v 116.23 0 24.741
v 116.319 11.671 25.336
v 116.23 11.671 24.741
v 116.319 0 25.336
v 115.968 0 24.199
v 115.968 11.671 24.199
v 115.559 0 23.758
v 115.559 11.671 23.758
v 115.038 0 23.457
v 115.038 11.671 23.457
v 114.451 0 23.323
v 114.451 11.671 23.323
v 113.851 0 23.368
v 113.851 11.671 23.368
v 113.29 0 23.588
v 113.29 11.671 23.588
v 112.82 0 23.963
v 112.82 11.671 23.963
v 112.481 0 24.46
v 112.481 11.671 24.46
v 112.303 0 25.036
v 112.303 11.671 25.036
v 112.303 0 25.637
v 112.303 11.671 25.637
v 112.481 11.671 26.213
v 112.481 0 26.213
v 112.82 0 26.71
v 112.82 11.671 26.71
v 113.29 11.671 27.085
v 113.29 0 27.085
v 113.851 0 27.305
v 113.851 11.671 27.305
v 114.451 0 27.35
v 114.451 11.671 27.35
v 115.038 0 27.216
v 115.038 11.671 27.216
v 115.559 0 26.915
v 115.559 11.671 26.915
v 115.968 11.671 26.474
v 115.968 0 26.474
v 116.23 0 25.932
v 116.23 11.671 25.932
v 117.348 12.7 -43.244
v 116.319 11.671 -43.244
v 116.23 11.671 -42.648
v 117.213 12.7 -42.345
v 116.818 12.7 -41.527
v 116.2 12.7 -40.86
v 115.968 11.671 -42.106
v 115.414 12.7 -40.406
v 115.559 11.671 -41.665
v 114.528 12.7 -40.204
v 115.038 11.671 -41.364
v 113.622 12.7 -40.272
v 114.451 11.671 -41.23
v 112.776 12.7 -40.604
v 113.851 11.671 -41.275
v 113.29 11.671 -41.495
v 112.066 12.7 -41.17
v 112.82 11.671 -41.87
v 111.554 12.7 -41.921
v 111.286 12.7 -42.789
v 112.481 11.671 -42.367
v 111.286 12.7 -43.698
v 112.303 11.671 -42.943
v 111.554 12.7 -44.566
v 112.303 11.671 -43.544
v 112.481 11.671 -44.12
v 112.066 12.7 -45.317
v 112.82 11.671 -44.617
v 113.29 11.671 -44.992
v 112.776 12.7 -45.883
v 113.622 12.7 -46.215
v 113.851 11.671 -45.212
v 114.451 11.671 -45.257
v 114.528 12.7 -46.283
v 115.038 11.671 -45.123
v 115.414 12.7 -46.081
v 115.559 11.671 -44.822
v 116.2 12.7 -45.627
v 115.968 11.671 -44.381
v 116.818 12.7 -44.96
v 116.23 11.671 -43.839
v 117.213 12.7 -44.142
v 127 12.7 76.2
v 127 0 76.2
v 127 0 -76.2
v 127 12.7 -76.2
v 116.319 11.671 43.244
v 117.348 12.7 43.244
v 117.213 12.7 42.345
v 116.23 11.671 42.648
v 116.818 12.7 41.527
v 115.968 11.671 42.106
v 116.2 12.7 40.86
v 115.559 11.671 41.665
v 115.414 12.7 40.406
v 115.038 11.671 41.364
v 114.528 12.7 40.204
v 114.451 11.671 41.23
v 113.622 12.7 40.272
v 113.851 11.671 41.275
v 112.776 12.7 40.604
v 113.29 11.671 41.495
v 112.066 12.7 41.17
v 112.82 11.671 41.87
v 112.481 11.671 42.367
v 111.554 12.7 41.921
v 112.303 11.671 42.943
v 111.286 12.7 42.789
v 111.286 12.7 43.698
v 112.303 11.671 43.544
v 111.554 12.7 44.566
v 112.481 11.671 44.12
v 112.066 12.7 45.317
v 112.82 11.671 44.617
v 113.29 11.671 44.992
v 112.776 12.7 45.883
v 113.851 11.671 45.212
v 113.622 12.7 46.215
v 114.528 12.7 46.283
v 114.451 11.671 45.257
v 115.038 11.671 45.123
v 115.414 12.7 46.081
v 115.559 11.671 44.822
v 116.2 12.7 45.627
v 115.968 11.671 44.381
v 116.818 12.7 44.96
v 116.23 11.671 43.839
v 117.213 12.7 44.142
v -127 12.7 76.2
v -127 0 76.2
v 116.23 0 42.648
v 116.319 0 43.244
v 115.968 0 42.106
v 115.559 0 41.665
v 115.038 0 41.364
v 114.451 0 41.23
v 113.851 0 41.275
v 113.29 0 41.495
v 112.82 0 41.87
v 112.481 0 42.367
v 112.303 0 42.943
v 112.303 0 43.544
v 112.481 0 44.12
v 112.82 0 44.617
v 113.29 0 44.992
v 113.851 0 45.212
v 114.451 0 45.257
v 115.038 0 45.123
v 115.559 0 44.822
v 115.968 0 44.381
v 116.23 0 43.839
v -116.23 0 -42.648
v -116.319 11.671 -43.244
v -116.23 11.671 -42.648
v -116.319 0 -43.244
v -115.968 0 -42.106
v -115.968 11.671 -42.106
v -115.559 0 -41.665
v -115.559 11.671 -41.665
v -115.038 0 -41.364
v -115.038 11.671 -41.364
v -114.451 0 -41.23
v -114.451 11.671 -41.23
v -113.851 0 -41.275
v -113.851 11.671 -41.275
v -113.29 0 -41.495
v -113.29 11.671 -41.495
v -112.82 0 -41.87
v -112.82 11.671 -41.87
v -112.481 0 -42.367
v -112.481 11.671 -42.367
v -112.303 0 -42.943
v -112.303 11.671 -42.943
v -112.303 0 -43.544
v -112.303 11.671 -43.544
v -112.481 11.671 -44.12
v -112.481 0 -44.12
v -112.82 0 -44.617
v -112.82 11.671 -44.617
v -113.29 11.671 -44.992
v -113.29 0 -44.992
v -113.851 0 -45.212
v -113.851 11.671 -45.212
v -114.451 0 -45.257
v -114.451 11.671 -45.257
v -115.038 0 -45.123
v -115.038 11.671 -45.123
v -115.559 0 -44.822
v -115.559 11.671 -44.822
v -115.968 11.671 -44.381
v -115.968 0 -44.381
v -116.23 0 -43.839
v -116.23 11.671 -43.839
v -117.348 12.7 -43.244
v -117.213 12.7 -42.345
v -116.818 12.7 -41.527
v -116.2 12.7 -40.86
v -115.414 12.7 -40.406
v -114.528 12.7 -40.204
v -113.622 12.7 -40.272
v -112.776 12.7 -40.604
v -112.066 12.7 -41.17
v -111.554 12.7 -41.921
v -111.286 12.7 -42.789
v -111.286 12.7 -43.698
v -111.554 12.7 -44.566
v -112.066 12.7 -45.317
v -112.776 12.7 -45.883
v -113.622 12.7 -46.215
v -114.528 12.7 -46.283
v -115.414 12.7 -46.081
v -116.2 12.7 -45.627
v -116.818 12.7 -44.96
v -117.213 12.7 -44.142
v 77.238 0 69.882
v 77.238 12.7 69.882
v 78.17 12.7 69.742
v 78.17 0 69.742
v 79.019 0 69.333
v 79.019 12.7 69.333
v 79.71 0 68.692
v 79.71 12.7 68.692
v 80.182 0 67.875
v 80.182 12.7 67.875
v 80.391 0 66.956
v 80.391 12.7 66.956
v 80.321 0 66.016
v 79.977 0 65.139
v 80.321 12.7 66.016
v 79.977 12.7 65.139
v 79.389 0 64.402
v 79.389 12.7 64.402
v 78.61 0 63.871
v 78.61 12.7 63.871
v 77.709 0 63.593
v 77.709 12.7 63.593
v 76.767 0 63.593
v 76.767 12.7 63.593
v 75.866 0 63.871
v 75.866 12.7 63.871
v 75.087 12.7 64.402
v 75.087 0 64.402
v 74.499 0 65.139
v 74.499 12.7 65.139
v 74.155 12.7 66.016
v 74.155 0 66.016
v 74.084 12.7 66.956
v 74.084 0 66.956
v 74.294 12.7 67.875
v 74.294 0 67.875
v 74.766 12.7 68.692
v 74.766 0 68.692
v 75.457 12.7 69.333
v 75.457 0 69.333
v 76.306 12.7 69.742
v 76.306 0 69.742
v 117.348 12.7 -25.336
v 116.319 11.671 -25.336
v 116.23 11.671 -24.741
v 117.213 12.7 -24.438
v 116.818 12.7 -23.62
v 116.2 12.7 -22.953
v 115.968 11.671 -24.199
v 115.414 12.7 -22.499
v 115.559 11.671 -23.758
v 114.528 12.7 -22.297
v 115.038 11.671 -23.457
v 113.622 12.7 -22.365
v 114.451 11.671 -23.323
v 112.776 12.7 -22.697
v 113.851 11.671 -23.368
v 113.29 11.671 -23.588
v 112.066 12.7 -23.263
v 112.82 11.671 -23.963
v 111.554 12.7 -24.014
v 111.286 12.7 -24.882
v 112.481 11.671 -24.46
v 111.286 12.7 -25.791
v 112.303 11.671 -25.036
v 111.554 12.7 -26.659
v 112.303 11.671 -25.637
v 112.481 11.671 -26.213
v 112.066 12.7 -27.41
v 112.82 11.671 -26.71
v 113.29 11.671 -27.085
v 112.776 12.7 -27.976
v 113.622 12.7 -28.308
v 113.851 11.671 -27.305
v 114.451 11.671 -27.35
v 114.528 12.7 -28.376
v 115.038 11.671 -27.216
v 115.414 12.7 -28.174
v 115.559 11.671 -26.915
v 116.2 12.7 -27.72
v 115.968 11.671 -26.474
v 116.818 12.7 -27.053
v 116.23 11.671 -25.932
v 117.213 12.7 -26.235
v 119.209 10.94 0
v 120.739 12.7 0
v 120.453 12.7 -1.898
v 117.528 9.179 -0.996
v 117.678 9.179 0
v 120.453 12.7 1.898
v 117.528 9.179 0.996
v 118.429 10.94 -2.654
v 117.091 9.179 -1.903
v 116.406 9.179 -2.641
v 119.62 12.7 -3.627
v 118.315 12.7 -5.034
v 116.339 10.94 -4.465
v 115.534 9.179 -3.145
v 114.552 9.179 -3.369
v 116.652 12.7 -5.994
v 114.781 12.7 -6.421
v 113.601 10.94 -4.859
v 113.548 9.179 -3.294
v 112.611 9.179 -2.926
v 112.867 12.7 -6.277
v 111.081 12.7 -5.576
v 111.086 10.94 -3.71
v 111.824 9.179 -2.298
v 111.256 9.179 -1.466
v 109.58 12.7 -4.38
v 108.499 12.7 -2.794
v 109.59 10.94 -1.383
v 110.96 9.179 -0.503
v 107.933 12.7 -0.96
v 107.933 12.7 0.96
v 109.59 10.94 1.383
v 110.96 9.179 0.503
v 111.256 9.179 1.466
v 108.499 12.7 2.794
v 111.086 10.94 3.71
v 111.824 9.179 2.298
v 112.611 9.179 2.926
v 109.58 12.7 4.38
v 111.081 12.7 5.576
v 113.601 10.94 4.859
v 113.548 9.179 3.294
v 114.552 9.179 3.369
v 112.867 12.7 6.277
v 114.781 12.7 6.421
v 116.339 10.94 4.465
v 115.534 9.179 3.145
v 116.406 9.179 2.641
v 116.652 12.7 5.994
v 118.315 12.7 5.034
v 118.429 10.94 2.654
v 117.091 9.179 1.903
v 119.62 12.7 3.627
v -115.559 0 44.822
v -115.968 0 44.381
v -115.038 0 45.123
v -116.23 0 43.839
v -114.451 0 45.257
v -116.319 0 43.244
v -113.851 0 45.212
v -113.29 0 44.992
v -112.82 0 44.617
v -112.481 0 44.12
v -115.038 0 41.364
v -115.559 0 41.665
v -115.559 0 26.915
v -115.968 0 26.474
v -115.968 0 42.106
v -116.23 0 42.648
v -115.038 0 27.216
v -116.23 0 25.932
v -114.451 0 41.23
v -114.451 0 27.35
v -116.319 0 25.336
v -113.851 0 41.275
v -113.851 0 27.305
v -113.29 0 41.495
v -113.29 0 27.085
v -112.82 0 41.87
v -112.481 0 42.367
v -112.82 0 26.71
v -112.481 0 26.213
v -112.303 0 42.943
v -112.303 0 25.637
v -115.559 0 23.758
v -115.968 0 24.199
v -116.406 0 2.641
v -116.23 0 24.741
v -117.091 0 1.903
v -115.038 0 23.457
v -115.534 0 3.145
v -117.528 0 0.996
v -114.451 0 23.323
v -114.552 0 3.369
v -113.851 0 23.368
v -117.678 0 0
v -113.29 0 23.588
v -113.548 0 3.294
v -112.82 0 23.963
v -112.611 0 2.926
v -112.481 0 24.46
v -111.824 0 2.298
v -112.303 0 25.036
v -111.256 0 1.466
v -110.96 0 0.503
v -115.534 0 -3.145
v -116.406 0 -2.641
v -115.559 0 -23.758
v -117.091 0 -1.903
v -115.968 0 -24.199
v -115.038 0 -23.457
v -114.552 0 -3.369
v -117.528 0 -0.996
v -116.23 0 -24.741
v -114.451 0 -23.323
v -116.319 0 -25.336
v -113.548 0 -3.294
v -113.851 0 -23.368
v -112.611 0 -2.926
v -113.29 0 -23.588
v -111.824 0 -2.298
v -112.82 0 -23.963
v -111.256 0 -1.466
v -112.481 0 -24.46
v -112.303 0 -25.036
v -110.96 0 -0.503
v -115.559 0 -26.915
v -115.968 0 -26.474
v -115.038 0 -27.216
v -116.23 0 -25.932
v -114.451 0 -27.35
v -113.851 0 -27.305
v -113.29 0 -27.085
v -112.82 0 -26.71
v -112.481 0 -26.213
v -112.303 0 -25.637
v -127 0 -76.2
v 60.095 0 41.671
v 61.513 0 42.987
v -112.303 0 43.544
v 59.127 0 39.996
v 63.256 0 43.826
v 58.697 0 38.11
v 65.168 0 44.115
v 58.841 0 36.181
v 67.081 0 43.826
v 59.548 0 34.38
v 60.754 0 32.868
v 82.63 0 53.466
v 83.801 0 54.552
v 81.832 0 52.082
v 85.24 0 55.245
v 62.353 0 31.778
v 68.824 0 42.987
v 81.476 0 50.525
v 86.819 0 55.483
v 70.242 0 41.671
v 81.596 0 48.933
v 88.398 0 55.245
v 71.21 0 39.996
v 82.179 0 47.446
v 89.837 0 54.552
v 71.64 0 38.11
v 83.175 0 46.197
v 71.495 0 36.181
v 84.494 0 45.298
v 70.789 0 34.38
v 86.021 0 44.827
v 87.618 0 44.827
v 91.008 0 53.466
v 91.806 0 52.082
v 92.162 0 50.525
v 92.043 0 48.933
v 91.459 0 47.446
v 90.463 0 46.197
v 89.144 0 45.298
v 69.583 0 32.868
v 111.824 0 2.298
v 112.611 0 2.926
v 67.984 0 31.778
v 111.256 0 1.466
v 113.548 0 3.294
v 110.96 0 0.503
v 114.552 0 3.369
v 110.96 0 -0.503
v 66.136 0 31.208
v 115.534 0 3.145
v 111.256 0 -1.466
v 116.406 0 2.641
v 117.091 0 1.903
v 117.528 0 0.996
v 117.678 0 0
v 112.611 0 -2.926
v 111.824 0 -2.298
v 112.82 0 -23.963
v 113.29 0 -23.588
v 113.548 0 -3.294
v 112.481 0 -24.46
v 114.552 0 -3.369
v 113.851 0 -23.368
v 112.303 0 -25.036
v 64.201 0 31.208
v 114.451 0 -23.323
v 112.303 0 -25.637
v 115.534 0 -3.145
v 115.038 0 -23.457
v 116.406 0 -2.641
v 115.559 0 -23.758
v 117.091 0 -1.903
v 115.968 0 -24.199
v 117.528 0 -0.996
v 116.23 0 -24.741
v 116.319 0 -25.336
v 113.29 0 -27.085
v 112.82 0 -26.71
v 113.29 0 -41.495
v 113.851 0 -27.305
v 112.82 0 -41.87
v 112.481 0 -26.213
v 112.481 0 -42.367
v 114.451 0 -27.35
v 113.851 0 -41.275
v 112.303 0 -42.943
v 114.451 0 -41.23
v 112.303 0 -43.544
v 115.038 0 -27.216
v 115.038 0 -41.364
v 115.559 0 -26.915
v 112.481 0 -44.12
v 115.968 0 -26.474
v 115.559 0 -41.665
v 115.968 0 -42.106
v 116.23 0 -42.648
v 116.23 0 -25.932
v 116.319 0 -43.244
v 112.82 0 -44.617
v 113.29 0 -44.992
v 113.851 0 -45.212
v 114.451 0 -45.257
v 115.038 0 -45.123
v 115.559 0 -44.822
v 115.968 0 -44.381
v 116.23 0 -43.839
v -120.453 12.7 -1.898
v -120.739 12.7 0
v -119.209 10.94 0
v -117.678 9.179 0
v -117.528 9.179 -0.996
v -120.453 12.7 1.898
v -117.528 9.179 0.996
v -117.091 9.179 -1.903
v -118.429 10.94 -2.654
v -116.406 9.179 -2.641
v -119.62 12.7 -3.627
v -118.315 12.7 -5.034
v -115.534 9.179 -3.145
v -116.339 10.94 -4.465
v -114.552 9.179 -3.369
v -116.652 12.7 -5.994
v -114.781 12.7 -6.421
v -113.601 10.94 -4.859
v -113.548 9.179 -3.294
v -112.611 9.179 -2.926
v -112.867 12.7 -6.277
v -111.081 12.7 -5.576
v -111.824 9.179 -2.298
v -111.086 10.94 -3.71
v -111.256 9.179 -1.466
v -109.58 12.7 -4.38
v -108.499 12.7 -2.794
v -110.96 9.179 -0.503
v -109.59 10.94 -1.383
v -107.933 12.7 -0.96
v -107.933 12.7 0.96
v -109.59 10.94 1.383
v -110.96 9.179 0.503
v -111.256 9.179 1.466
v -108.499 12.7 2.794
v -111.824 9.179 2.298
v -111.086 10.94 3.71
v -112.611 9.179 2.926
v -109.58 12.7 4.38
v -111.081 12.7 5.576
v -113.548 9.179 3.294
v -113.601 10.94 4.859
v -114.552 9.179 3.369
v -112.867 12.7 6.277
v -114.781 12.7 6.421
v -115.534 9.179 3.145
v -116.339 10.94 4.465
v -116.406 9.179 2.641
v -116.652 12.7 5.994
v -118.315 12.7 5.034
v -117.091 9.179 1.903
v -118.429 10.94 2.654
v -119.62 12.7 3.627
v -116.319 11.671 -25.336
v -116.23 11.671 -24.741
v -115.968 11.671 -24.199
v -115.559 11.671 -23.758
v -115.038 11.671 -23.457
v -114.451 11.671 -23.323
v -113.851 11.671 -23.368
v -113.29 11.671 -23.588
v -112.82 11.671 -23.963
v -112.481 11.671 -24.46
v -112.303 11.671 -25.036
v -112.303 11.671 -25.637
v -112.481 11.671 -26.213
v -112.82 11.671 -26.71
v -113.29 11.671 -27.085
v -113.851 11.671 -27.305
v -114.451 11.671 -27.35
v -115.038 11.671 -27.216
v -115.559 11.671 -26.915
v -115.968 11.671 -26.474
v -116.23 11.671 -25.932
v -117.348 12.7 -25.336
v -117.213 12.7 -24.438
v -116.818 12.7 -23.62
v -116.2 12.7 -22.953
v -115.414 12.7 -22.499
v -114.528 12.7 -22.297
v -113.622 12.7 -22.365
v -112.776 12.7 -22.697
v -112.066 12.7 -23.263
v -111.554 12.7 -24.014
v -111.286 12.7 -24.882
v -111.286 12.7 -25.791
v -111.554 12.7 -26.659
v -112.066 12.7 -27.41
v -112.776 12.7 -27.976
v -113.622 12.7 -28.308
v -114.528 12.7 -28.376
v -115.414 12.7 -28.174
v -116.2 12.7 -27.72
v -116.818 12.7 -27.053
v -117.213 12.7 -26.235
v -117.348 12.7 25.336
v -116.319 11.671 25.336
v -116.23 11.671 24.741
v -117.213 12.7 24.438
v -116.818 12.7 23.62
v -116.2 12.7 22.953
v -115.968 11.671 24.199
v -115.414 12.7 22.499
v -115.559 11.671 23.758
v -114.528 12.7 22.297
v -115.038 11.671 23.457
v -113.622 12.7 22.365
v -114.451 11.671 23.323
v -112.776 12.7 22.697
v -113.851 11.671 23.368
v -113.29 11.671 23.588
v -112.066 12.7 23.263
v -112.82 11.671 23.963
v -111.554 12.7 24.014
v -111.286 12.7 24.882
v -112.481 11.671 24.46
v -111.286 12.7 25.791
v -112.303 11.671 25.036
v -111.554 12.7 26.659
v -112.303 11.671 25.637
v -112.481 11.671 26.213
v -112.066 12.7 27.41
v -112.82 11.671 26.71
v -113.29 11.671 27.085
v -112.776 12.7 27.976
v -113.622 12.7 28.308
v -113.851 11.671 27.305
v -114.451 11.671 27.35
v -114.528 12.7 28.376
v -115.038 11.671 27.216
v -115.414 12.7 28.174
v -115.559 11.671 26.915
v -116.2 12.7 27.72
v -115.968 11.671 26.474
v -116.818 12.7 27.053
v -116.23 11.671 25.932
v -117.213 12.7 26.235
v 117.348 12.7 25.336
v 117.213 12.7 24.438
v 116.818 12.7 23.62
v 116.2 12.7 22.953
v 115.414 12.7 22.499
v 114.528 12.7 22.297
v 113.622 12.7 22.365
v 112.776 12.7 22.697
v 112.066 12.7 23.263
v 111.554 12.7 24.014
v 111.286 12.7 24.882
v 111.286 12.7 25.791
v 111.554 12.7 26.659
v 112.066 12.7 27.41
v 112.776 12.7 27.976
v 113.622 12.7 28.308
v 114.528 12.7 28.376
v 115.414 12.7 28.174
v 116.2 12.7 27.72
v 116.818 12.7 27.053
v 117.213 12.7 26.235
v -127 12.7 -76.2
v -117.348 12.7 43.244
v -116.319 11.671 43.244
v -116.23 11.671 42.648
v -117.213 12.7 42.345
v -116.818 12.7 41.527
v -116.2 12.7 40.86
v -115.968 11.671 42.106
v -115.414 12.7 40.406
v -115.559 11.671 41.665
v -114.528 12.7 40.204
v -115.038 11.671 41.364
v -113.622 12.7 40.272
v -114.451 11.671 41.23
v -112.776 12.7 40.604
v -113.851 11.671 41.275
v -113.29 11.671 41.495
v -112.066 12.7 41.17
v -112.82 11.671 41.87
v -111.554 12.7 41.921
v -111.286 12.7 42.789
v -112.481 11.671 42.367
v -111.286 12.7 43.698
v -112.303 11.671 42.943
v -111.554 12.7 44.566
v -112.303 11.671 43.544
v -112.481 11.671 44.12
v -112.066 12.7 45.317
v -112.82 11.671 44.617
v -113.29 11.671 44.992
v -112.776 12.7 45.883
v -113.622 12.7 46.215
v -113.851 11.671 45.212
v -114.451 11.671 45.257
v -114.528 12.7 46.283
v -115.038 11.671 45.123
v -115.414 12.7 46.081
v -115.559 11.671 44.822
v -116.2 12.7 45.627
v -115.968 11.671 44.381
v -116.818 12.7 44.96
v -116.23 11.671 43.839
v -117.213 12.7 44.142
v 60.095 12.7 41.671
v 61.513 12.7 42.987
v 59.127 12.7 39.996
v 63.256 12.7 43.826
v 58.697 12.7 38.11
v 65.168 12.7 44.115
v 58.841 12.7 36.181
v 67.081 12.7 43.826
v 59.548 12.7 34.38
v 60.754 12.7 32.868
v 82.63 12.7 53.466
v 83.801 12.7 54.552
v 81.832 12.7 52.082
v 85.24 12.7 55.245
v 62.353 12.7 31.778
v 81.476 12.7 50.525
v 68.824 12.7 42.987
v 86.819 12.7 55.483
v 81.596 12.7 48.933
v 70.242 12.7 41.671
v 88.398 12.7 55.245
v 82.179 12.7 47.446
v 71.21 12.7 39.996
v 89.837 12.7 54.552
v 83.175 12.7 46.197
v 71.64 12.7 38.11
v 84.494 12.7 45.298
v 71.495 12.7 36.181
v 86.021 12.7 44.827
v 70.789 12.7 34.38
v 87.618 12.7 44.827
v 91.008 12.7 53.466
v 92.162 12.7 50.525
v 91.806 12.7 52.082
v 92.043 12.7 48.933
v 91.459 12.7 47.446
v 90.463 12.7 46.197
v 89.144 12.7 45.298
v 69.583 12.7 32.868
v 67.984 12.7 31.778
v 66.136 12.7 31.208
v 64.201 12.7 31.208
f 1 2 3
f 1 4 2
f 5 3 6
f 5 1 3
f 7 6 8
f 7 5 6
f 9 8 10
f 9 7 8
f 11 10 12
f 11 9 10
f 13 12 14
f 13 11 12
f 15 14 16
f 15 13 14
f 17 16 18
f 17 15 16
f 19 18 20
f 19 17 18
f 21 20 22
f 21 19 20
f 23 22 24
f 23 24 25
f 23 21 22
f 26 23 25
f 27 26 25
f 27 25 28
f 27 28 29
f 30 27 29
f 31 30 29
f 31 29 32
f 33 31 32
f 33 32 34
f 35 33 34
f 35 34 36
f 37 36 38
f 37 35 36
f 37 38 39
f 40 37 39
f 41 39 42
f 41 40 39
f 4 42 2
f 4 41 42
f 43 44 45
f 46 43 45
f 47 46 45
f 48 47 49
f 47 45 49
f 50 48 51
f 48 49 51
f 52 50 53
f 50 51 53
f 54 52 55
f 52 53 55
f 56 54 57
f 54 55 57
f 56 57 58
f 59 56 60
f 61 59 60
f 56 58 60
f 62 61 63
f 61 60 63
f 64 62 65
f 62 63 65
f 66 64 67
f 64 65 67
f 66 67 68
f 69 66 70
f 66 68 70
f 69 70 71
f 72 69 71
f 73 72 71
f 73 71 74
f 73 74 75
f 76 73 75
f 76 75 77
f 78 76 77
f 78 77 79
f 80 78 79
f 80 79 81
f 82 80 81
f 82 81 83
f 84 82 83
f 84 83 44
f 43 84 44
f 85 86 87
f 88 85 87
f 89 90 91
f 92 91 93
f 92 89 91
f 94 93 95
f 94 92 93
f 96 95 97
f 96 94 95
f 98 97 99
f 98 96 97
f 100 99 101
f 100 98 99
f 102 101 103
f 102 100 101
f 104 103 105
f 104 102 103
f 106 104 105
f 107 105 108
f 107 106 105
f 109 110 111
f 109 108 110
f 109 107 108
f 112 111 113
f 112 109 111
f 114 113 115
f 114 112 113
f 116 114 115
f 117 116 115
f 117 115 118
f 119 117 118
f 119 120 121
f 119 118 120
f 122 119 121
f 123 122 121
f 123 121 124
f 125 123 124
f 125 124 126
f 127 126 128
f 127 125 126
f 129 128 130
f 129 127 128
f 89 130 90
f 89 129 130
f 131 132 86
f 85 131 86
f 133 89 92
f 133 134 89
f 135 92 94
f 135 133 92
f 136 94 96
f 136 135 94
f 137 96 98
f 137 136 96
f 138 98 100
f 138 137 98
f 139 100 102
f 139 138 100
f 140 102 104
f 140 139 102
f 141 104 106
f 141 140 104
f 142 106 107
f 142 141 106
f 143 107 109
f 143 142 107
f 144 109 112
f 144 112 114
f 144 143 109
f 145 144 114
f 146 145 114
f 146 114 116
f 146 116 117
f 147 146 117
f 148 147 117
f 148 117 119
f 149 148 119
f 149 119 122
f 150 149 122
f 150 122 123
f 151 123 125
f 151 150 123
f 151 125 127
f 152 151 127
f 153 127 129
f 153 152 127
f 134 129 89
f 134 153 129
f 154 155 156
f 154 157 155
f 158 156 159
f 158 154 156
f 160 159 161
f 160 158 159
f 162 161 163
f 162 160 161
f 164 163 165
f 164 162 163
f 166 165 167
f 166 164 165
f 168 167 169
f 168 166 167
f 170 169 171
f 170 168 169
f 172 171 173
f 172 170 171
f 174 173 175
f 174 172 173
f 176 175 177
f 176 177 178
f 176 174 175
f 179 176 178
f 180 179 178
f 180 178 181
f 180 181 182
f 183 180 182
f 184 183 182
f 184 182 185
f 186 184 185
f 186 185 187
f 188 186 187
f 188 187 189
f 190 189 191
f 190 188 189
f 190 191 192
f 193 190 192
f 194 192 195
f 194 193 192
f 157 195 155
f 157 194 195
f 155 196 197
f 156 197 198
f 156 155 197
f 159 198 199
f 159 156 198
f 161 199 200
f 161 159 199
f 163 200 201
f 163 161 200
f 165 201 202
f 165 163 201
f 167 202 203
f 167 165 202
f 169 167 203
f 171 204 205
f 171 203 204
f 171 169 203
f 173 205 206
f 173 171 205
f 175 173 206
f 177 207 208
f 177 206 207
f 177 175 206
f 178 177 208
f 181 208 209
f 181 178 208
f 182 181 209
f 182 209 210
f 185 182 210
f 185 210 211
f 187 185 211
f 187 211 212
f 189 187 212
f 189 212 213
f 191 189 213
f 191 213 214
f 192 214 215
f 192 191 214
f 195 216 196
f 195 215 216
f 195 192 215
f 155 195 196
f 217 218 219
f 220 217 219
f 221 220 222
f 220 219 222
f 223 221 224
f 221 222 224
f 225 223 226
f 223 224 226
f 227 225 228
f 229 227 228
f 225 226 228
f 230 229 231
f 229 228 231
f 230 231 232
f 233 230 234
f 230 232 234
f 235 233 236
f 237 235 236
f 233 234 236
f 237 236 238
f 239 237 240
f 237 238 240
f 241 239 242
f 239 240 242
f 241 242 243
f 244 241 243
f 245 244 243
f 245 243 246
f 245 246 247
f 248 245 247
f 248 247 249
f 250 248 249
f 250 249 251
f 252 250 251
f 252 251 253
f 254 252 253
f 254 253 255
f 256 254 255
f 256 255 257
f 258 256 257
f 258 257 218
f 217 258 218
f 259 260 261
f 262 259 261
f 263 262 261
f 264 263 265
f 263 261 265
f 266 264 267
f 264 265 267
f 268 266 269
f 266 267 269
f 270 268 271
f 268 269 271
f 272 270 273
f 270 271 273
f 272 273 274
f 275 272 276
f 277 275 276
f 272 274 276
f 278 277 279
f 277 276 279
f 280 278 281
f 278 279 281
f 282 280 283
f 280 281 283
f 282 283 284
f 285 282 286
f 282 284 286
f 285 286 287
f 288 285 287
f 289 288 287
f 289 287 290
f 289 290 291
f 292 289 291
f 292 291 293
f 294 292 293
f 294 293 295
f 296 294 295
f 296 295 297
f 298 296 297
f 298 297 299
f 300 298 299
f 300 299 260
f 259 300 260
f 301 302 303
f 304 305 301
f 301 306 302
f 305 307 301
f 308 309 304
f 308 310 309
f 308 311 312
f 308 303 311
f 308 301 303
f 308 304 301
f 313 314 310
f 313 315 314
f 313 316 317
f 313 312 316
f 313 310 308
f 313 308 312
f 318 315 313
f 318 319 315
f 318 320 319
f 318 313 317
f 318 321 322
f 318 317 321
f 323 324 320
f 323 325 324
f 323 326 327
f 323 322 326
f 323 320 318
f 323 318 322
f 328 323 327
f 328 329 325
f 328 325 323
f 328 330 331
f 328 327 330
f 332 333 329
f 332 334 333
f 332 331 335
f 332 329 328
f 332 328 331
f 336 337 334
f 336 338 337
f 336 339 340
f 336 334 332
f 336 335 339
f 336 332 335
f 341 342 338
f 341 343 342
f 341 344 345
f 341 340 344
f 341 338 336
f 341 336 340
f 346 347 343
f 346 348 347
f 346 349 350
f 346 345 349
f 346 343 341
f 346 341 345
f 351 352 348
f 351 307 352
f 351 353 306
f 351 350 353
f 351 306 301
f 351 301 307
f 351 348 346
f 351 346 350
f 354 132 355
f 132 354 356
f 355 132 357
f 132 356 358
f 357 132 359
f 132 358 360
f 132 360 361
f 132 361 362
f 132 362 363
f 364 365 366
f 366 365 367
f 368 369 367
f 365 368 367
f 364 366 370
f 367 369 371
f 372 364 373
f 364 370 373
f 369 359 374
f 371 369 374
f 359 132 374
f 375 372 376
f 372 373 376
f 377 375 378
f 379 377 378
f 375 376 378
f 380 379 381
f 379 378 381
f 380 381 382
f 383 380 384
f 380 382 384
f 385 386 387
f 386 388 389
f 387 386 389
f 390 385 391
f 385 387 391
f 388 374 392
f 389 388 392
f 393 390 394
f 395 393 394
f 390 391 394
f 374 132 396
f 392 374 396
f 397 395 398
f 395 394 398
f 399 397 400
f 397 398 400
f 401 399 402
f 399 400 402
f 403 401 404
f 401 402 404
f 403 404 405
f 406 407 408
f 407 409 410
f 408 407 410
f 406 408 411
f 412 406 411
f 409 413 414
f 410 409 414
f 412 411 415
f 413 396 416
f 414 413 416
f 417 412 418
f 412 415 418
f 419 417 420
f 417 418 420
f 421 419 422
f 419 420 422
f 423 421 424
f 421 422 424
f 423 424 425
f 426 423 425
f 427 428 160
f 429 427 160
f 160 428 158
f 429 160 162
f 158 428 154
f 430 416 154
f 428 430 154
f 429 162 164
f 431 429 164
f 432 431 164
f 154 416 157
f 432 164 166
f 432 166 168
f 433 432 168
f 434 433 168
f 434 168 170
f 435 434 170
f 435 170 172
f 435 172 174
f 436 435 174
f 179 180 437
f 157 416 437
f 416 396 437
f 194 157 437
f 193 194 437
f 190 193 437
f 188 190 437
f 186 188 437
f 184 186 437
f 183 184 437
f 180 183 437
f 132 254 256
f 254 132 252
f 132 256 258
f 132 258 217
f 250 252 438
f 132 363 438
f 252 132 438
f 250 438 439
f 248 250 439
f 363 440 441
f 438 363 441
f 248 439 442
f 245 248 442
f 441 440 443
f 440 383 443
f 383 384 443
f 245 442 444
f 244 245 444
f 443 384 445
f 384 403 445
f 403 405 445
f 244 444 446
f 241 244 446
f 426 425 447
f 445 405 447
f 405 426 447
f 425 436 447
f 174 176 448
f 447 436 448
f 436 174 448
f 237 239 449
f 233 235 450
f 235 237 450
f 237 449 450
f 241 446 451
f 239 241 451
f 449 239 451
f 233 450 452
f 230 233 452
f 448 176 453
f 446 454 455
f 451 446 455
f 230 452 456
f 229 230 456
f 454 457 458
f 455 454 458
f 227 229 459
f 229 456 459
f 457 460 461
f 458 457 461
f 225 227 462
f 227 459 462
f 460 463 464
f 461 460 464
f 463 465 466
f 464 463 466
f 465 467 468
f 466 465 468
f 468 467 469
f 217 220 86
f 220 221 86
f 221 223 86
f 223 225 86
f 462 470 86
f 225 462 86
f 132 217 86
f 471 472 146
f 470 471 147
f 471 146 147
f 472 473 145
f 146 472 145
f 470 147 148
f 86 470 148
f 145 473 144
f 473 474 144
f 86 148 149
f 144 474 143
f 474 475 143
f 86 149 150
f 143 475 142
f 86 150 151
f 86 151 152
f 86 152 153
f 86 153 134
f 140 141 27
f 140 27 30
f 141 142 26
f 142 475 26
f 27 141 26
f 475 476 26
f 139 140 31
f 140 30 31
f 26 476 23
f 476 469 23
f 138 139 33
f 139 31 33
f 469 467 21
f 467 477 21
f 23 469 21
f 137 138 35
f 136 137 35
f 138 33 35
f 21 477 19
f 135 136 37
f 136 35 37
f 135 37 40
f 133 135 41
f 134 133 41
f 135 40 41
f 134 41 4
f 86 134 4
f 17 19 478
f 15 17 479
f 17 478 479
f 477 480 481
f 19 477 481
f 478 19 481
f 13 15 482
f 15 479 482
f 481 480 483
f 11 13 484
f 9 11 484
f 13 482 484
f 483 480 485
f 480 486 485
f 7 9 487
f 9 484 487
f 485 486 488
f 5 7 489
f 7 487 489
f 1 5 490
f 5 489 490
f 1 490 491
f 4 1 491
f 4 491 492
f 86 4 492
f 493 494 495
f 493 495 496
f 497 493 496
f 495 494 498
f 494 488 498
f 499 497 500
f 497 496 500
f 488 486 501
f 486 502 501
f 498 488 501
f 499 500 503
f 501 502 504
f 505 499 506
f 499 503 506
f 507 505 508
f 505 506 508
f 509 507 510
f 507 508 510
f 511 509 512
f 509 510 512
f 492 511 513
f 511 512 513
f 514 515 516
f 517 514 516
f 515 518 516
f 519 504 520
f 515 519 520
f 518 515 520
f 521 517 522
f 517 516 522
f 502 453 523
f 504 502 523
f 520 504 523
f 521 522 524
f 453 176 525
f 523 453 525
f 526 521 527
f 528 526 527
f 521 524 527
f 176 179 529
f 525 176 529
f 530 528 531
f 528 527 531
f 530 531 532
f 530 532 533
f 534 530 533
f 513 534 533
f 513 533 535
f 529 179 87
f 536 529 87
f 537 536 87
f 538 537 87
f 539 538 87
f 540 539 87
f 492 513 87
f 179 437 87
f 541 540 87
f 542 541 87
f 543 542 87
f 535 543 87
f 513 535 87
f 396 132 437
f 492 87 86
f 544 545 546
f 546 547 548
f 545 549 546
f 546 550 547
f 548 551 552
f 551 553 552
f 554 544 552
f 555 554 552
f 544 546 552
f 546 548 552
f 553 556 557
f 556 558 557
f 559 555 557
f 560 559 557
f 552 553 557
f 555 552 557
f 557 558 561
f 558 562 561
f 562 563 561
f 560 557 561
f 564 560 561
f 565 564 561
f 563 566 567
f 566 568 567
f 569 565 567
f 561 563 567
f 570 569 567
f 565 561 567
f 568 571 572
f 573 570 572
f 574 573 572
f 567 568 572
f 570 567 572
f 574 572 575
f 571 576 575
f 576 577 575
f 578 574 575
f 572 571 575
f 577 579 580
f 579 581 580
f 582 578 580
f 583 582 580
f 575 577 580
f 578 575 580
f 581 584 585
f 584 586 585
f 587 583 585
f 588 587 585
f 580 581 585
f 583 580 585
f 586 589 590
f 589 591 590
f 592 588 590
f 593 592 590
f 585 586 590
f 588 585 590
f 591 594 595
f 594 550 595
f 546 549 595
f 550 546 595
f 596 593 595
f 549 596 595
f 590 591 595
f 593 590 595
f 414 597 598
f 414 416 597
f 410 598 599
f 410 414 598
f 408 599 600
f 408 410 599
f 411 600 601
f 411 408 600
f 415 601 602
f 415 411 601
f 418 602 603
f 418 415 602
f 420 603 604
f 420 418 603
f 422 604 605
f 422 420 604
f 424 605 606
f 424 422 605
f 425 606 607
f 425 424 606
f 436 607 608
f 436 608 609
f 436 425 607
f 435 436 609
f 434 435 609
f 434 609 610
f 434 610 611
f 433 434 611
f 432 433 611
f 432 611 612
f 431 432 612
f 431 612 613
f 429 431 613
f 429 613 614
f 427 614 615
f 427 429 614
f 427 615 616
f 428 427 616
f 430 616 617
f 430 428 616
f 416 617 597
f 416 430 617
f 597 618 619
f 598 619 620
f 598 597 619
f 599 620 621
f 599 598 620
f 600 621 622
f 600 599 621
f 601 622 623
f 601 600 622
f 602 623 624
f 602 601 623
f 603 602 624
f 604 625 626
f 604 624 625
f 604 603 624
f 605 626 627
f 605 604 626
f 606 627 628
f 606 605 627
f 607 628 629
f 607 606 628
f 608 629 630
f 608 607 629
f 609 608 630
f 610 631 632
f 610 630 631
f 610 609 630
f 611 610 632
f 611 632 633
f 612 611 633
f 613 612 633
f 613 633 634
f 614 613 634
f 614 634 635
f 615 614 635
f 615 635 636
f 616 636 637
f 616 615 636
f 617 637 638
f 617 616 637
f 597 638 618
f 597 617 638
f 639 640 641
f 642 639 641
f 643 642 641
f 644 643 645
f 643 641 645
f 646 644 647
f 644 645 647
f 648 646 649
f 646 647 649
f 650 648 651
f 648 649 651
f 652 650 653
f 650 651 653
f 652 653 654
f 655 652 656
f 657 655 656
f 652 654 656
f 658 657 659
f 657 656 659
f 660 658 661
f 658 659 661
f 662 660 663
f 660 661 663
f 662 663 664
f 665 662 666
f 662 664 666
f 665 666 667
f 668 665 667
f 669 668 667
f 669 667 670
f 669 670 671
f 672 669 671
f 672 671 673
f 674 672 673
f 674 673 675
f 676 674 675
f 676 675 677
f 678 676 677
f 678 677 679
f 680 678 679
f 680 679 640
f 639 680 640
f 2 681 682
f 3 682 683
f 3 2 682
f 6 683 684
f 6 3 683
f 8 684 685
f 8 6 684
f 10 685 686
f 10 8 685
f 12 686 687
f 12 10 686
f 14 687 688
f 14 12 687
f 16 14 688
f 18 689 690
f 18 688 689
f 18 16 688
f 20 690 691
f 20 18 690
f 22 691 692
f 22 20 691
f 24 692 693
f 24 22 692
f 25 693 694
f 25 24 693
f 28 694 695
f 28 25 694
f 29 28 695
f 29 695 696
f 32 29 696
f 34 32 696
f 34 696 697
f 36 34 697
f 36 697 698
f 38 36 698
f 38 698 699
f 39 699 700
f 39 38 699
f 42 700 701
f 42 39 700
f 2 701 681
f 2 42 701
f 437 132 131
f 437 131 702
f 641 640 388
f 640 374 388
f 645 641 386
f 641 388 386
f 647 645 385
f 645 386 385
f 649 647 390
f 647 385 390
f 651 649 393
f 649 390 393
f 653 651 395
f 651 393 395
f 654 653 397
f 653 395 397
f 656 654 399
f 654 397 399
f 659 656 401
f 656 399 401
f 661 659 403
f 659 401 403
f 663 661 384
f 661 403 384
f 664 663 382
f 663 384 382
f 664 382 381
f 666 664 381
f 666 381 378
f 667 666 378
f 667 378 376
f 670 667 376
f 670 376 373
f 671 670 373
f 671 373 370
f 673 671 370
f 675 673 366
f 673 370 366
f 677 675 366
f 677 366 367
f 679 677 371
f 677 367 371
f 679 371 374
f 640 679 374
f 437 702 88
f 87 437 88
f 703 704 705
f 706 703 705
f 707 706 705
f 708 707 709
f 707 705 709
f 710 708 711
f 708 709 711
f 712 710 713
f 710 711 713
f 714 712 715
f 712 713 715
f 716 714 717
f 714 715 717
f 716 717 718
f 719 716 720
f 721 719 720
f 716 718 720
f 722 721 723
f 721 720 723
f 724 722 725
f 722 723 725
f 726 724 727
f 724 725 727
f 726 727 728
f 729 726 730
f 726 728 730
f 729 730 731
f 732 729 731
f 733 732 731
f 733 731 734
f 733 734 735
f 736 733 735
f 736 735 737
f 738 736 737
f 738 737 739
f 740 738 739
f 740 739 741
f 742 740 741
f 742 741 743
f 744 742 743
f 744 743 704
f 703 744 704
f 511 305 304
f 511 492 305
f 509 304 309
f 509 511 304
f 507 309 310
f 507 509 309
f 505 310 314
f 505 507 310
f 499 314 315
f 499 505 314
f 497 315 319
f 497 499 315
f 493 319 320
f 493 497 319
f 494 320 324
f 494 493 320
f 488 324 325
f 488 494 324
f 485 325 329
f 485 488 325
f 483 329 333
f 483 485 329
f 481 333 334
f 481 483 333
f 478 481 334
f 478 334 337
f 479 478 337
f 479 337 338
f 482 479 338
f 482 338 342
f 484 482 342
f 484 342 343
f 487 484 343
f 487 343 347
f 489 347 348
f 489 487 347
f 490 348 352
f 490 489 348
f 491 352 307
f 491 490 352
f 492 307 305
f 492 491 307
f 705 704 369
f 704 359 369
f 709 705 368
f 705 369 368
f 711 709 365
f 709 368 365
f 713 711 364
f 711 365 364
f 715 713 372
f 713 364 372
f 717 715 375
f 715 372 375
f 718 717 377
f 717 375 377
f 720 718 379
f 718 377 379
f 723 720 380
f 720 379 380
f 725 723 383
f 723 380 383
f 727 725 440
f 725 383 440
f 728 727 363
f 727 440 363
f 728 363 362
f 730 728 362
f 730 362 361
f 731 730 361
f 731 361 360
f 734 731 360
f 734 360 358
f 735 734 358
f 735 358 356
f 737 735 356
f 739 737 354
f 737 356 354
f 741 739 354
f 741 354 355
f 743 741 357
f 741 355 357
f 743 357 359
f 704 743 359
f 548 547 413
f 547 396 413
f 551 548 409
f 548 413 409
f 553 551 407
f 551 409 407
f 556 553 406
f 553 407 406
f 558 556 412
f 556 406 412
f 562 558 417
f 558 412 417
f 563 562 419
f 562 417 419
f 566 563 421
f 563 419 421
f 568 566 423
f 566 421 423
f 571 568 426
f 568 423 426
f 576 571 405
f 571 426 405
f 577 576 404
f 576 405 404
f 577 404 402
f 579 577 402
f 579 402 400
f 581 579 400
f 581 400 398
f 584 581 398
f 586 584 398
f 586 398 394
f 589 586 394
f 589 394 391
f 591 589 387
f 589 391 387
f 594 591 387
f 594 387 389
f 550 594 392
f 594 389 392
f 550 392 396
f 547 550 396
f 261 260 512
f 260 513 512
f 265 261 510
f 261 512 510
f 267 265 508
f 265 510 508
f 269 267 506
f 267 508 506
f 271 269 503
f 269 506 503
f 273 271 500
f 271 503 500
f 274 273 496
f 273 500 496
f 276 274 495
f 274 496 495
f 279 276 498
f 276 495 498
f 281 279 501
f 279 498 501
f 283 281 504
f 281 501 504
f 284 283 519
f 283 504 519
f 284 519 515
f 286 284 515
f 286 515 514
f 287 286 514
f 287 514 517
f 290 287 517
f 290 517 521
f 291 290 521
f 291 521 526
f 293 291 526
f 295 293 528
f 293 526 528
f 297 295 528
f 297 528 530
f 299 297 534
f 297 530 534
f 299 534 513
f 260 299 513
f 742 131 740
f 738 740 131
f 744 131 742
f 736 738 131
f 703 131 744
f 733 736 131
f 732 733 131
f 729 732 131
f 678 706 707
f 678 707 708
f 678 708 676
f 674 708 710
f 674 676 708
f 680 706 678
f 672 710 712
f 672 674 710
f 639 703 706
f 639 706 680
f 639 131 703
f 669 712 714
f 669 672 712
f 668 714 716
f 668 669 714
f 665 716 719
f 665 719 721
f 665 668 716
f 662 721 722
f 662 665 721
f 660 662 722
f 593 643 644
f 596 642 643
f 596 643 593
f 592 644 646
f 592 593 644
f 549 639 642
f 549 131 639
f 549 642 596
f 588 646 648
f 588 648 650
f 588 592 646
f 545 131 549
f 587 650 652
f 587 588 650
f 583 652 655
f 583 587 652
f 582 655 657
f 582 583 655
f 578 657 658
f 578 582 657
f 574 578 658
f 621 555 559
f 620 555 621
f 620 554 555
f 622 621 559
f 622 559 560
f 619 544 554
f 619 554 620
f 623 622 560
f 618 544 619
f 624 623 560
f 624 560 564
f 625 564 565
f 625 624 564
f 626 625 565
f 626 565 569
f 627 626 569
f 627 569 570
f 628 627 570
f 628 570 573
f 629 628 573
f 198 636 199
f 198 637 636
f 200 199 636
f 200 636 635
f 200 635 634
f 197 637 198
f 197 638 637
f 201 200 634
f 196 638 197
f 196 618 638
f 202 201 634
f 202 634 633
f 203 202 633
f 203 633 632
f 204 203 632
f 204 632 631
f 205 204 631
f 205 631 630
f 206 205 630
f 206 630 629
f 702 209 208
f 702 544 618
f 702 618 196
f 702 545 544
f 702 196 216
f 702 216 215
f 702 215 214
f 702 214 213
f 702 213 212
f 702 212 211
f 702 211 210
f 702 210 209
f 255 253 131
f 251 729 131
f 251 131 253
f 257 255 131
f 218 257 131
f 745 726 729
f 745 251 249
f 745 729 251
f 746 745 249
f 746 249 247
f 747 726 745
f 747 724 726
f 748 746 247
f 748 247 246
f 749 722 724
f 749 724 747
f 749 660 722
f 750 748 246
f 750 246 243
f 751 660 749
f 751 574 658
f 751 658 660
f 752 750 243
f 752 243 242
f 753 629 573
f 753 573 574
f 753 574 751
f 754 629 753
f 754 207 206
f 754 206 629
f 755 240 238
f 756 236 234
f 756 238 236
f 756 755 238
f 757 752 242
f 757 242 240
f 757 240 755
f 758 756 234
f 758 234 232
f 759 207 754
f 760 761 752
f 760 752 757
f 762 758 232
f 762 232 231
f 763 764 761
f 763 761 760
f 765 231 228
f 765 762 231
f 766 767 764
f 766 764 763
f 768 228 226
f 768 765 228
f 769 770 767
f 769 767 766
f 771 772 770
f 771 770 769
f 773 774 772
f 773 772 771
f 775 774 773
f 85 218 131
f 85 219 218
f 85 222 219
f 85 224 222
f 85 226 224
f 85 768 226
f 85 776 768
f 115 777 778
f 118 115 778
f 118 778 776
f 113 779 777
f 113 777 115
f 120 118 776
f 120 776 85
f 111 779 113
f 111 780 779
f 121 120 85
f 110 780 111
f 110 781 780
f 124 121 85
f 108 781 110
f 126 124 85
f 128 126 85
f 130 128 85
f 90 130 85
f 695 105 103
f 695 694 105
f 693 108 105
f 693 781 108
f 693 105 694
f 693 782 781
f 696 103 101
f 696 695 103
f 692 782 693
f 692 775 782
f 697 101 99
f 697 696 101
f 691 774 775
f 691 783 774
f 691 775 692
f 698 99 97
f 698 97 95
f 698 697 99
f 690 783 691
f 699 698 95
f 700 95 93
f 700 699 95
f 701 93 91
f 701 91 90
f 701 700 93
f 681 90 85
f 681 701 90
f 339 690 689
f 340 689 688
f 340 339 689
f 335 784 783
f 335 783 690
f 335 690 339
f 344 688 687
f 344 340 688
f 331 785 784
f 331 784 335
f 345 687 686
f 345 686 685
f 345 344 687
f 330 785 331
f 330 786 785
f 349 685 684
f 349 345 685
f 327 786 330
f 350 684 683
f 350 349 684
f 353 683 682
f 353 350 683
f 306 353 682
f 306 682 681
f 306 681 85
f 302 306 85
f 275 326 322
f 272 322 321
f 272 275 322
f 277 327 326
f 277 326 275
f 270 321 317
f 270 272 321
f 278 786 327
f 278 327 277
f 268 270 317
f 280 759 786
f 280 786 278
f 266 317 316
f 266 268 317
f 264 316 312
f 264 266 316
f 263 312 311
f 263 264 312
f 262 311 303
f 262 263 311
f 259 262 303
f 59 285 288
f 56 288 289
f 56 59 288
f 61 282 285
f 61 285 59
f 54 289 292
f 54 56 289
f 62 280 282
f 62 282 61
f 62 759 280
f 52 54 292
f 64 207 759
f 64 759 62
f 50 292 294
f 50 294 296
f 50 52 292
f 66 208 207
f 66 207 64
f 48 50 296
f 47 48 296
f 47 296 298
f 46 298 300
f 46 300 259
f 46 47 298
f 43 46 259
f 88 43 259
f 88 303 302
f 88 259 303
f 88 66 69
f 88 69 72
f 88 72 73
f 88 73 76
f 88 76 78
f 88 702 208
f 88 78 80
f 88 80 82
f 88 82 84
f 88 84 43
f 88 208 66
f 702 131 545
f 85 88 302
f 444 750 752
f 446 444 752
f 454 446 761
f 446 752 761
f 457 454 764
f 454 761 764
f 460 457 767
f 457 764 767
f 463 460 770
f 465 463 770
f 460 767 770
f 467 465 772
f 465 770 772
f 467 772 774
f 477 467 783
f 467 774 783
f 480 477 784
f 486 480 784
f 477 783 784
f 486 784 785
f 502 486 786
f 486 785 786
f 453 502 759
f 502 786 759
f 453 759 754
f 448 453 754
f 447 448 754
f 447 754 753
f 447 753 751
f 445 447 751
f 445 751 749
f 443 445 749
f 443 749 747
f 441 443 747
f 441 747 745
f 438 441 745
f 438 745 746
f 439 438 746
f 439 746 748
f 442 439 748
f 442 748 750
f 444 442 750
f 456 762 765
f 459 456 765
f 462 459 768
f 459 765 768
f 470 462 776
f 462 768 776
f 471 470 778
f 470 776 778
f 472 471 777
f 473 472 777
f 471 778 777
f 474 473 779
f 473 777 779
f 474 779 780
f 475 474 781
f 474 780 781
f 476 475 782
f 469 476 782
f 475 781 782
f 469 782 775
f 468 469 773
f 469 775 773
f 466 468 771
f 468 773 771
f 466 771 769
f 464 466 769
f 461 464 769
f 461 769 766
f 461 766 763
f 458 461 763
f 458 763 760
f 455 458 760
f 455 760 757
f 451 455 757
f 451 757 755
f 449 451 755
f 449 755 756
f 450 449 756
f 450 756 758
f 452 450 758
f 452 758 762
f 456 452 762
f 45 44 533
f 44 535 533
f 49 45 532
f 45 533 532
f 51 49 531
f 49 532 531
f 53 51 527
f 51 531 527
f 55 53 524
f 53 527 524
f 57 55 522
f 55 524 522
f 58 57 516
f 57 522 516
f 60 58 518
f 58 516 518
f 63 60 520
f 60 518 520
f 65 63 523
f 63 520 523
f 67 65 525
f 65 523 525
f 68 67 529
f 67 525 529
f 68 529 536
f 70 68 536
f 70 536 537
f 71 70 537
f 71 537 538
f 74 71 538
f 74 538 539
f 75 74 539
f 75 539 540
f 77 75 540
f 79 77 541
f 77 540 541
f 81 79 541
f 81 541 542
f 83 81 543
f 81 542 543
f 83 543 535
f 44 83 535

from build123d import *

# Parameters (mm, degrees)
SKETCH1_W                                        = 254
SKETCH1_H                                        = 152.4
BOSS_EXTRUDE1_DEPTH                              = 12.7
SKETCH2_W                                        = 203.2
SKETCH2_H                                        = 63.5
CUT_EXTRUDE1_DEPTH                               = 149.649688866
SKETCH11_W                                       = 203.2
SKETCH11_H                                       = 63.5
BOSS_EXTRUDE2_DEPTH                              = 12.7
SKETCH13_R                                       = 5.3578125
SKETCH13_R_2                                     = 6.4897
CUT_EXTRUDE8_DEPTH                               = 149.649688866
SKETCH14_R                                       = 3.1623
CUT_EXTRUDE9_DEPTH                               = 149.649688866
F_10_32_TAPPED_HOLE2_D                           = 4.0386
F_10_32_TAPPED_HOLE2_CSINK_D                     = 6.096
F_10_32_TAPPED_HOLE2_CSINK_ANGLE                 = 90
MIRROR2_COPY_1_D                                 = 4.0386
MIRROR2_COPY_1_CSINK_D                           = 6.096
MIRROR2_COPY_1_CSINK_ANGLE                       = 90
CSK_FOR_1_4_FLAT_HEAD_MACHINE_SCREW1_D           = 6.7564
CSK_FOR_1_4_FLAT_HEAD_MACHINE_SCREW1_CSINK_D     = 12.8778
CSK_FOR_1_4_FLAT_HEAD_MACHINE_SCREW1_CSINK_ANGLE = 82


with BuildPart() as part:
    # Sketch1 → Boss-Extrude1 (new body)
    with BuildSketch(Plane(origin=(0, 0, 0), x_dir=(1, 0, 0), z_dir=(0, 1, 0))):
        Rectangle(SKETCH1_W, SKETCH1_H)
    extrude(amount=BOSS_EXTRUDE1_DEPTH)

    # Sketch2 → Cut-Extrude1 (cut, through all)
    with BuildSketch(Plane(origin=(0, 12.7, 0), x_dir=(1, 0, 0), z_dir=(0, 1, 0))):
        with Locations((0, -44.45)):
            Rectangle(SKETCH2_W, SKETCH2_H)
        with Locations((0, 44.45)):
            Rectangle(SKETCH2_W, SKETCH2_H)
    extrude(amount=-CUT_EXTRUDE1_DEPTH, mode=Mode.SUBTRACT)

    # Sketch11 → Boss-Extrude2 (add)
    with BuildSketch(Plane(origin=(0, 12.7, 0), x_dir=(1, 0, 0), z_dir=(0, 1, 0))):
        with Locations((0, 44.45)):
            Rectangle(SKETCH11_W, SKETCH11_H)
        with Locations((0, -44.45)):
            Rectangle(SKETCH11_W, SKETCH11_H)
    extrude(amount=-BOSS_EXTRUDE2_DEPTH)

    # Sketch13 → Cut-Extrude8 (cut, through all)
    with BuildSketch(Plane(origin=(0, 12.7, 0), x_dir=(1, 0, 0), z_dir=(0, 1, 0))):
        with Locations(Location((86.819046868, -50.12500008, 0), (0, 0, 270))):
            Circle(SKETCH13_R)
        with Locations(Location((65.16841174, -37.625000061, 0), (0, 0, 270))):
            Circle(SKETCH13_R_2)
    extrude(amount=-CUT_EXTRUDE8_DEPTH, mode=Mode.SUBTRACT)

    # Sketch14 → Cut-Extrude9 (cut, through all)
    with BuildSketch(Plane(origin=(0, 12.7, 0), x_dir=(1, 0, 0), z_dir=(0, 1, 0))):
        with Locations(Location((77.237896866, -66.720038678, 0), (0, 0, 270))):
            Circle(SKETCH14_R)
    extrude(amount=-CUT_EXTRUDE9_DEPTH, mode=Mode.SUBTRACT)

    # #10-32 Tapped Hole2 (through all)
    with Locations(Plane(origin=(0, 12.7, 0), x_dir=(1, 0, 0), z_dir=(0, 1, 0))):
        with Locations((-114.3, -25.3365), (-114.3, -43.2435)):
            f_10_32_tapped_hole2 = CounterSinkHole(F_10_32_TAPPED_HOLE2_D / 2, F_10_32_TAPPED_HOLE2_CSINK_D / 2, counter_sink_angle=F_10_32_TAPPED_HOLE2_CSINK_ANGLE)

    # Mirror1: #10-32 Tapped Hole2 across plane
    add(f_10_32_tapped_hole2.mirror(Plane.XY), mode=Mode.SUBTRACT)

    # Mirror2: #10-32 Tapped Hole2 across plane
    add(f_10_32_tapped_hole2.mirror(Plane(origin=(0, 0, 0), x_dir=(0, 0, 1), z_dir=(1, 0, 0))), mode=Mode.SUBTRACT)

    # Mirror2 copy 1 (through all)
    with Locations(Plane(origin=(0, 12.7, 0), x_dir=(-1, 0, 0), z_dir=(0, 1, 0))):
        with Locations((-114.3, -25.3365), (-114.3, -43.2435)):
            CounterSinkHole(MIRROR2_COPY_1_D / 2, MIRROR2_COPY_1_CSINK_D / 2, counter_sink_angle=MIRROR2_COPY_1_CSINK_ANGLE)

    # CSK for 1/4 Flat Head Machine Screw1 (through all)
    with Locations(Plane(origin=(0, 12.7, 0), x_dir=(1, 0, 0), z_dir=(0, 1, 0))):
        with Locations((-114.3, 0)):
            csk_for_1_4_flat_head_machine_screw1 = CounterSinkHole(CSK_FOR_1_4_FLAT_HEAD_MACHINE_SCREW1_D / 2, CSK_FOR_1_4_FLAT_HEAD_MACHINE_SCREW1_CSINK_D / 2, counter_sink_angle=CSK_FOR_1_4_FLAT_HEAD_MACHINE_SCREW1_CSINK_ANGLE)

    # Mirror3: CSK for 1/4 Flat Head Machine Screw1 across plane
    add(csk_for_1_4_flat_head_machine_screw1.mirror(Plane(origin=(0, 0, 0), x_dir=(0, 0, 1), z_dir=(1, 0, 0))), mode=Mode.SUBTRACT)


solid = part.part
